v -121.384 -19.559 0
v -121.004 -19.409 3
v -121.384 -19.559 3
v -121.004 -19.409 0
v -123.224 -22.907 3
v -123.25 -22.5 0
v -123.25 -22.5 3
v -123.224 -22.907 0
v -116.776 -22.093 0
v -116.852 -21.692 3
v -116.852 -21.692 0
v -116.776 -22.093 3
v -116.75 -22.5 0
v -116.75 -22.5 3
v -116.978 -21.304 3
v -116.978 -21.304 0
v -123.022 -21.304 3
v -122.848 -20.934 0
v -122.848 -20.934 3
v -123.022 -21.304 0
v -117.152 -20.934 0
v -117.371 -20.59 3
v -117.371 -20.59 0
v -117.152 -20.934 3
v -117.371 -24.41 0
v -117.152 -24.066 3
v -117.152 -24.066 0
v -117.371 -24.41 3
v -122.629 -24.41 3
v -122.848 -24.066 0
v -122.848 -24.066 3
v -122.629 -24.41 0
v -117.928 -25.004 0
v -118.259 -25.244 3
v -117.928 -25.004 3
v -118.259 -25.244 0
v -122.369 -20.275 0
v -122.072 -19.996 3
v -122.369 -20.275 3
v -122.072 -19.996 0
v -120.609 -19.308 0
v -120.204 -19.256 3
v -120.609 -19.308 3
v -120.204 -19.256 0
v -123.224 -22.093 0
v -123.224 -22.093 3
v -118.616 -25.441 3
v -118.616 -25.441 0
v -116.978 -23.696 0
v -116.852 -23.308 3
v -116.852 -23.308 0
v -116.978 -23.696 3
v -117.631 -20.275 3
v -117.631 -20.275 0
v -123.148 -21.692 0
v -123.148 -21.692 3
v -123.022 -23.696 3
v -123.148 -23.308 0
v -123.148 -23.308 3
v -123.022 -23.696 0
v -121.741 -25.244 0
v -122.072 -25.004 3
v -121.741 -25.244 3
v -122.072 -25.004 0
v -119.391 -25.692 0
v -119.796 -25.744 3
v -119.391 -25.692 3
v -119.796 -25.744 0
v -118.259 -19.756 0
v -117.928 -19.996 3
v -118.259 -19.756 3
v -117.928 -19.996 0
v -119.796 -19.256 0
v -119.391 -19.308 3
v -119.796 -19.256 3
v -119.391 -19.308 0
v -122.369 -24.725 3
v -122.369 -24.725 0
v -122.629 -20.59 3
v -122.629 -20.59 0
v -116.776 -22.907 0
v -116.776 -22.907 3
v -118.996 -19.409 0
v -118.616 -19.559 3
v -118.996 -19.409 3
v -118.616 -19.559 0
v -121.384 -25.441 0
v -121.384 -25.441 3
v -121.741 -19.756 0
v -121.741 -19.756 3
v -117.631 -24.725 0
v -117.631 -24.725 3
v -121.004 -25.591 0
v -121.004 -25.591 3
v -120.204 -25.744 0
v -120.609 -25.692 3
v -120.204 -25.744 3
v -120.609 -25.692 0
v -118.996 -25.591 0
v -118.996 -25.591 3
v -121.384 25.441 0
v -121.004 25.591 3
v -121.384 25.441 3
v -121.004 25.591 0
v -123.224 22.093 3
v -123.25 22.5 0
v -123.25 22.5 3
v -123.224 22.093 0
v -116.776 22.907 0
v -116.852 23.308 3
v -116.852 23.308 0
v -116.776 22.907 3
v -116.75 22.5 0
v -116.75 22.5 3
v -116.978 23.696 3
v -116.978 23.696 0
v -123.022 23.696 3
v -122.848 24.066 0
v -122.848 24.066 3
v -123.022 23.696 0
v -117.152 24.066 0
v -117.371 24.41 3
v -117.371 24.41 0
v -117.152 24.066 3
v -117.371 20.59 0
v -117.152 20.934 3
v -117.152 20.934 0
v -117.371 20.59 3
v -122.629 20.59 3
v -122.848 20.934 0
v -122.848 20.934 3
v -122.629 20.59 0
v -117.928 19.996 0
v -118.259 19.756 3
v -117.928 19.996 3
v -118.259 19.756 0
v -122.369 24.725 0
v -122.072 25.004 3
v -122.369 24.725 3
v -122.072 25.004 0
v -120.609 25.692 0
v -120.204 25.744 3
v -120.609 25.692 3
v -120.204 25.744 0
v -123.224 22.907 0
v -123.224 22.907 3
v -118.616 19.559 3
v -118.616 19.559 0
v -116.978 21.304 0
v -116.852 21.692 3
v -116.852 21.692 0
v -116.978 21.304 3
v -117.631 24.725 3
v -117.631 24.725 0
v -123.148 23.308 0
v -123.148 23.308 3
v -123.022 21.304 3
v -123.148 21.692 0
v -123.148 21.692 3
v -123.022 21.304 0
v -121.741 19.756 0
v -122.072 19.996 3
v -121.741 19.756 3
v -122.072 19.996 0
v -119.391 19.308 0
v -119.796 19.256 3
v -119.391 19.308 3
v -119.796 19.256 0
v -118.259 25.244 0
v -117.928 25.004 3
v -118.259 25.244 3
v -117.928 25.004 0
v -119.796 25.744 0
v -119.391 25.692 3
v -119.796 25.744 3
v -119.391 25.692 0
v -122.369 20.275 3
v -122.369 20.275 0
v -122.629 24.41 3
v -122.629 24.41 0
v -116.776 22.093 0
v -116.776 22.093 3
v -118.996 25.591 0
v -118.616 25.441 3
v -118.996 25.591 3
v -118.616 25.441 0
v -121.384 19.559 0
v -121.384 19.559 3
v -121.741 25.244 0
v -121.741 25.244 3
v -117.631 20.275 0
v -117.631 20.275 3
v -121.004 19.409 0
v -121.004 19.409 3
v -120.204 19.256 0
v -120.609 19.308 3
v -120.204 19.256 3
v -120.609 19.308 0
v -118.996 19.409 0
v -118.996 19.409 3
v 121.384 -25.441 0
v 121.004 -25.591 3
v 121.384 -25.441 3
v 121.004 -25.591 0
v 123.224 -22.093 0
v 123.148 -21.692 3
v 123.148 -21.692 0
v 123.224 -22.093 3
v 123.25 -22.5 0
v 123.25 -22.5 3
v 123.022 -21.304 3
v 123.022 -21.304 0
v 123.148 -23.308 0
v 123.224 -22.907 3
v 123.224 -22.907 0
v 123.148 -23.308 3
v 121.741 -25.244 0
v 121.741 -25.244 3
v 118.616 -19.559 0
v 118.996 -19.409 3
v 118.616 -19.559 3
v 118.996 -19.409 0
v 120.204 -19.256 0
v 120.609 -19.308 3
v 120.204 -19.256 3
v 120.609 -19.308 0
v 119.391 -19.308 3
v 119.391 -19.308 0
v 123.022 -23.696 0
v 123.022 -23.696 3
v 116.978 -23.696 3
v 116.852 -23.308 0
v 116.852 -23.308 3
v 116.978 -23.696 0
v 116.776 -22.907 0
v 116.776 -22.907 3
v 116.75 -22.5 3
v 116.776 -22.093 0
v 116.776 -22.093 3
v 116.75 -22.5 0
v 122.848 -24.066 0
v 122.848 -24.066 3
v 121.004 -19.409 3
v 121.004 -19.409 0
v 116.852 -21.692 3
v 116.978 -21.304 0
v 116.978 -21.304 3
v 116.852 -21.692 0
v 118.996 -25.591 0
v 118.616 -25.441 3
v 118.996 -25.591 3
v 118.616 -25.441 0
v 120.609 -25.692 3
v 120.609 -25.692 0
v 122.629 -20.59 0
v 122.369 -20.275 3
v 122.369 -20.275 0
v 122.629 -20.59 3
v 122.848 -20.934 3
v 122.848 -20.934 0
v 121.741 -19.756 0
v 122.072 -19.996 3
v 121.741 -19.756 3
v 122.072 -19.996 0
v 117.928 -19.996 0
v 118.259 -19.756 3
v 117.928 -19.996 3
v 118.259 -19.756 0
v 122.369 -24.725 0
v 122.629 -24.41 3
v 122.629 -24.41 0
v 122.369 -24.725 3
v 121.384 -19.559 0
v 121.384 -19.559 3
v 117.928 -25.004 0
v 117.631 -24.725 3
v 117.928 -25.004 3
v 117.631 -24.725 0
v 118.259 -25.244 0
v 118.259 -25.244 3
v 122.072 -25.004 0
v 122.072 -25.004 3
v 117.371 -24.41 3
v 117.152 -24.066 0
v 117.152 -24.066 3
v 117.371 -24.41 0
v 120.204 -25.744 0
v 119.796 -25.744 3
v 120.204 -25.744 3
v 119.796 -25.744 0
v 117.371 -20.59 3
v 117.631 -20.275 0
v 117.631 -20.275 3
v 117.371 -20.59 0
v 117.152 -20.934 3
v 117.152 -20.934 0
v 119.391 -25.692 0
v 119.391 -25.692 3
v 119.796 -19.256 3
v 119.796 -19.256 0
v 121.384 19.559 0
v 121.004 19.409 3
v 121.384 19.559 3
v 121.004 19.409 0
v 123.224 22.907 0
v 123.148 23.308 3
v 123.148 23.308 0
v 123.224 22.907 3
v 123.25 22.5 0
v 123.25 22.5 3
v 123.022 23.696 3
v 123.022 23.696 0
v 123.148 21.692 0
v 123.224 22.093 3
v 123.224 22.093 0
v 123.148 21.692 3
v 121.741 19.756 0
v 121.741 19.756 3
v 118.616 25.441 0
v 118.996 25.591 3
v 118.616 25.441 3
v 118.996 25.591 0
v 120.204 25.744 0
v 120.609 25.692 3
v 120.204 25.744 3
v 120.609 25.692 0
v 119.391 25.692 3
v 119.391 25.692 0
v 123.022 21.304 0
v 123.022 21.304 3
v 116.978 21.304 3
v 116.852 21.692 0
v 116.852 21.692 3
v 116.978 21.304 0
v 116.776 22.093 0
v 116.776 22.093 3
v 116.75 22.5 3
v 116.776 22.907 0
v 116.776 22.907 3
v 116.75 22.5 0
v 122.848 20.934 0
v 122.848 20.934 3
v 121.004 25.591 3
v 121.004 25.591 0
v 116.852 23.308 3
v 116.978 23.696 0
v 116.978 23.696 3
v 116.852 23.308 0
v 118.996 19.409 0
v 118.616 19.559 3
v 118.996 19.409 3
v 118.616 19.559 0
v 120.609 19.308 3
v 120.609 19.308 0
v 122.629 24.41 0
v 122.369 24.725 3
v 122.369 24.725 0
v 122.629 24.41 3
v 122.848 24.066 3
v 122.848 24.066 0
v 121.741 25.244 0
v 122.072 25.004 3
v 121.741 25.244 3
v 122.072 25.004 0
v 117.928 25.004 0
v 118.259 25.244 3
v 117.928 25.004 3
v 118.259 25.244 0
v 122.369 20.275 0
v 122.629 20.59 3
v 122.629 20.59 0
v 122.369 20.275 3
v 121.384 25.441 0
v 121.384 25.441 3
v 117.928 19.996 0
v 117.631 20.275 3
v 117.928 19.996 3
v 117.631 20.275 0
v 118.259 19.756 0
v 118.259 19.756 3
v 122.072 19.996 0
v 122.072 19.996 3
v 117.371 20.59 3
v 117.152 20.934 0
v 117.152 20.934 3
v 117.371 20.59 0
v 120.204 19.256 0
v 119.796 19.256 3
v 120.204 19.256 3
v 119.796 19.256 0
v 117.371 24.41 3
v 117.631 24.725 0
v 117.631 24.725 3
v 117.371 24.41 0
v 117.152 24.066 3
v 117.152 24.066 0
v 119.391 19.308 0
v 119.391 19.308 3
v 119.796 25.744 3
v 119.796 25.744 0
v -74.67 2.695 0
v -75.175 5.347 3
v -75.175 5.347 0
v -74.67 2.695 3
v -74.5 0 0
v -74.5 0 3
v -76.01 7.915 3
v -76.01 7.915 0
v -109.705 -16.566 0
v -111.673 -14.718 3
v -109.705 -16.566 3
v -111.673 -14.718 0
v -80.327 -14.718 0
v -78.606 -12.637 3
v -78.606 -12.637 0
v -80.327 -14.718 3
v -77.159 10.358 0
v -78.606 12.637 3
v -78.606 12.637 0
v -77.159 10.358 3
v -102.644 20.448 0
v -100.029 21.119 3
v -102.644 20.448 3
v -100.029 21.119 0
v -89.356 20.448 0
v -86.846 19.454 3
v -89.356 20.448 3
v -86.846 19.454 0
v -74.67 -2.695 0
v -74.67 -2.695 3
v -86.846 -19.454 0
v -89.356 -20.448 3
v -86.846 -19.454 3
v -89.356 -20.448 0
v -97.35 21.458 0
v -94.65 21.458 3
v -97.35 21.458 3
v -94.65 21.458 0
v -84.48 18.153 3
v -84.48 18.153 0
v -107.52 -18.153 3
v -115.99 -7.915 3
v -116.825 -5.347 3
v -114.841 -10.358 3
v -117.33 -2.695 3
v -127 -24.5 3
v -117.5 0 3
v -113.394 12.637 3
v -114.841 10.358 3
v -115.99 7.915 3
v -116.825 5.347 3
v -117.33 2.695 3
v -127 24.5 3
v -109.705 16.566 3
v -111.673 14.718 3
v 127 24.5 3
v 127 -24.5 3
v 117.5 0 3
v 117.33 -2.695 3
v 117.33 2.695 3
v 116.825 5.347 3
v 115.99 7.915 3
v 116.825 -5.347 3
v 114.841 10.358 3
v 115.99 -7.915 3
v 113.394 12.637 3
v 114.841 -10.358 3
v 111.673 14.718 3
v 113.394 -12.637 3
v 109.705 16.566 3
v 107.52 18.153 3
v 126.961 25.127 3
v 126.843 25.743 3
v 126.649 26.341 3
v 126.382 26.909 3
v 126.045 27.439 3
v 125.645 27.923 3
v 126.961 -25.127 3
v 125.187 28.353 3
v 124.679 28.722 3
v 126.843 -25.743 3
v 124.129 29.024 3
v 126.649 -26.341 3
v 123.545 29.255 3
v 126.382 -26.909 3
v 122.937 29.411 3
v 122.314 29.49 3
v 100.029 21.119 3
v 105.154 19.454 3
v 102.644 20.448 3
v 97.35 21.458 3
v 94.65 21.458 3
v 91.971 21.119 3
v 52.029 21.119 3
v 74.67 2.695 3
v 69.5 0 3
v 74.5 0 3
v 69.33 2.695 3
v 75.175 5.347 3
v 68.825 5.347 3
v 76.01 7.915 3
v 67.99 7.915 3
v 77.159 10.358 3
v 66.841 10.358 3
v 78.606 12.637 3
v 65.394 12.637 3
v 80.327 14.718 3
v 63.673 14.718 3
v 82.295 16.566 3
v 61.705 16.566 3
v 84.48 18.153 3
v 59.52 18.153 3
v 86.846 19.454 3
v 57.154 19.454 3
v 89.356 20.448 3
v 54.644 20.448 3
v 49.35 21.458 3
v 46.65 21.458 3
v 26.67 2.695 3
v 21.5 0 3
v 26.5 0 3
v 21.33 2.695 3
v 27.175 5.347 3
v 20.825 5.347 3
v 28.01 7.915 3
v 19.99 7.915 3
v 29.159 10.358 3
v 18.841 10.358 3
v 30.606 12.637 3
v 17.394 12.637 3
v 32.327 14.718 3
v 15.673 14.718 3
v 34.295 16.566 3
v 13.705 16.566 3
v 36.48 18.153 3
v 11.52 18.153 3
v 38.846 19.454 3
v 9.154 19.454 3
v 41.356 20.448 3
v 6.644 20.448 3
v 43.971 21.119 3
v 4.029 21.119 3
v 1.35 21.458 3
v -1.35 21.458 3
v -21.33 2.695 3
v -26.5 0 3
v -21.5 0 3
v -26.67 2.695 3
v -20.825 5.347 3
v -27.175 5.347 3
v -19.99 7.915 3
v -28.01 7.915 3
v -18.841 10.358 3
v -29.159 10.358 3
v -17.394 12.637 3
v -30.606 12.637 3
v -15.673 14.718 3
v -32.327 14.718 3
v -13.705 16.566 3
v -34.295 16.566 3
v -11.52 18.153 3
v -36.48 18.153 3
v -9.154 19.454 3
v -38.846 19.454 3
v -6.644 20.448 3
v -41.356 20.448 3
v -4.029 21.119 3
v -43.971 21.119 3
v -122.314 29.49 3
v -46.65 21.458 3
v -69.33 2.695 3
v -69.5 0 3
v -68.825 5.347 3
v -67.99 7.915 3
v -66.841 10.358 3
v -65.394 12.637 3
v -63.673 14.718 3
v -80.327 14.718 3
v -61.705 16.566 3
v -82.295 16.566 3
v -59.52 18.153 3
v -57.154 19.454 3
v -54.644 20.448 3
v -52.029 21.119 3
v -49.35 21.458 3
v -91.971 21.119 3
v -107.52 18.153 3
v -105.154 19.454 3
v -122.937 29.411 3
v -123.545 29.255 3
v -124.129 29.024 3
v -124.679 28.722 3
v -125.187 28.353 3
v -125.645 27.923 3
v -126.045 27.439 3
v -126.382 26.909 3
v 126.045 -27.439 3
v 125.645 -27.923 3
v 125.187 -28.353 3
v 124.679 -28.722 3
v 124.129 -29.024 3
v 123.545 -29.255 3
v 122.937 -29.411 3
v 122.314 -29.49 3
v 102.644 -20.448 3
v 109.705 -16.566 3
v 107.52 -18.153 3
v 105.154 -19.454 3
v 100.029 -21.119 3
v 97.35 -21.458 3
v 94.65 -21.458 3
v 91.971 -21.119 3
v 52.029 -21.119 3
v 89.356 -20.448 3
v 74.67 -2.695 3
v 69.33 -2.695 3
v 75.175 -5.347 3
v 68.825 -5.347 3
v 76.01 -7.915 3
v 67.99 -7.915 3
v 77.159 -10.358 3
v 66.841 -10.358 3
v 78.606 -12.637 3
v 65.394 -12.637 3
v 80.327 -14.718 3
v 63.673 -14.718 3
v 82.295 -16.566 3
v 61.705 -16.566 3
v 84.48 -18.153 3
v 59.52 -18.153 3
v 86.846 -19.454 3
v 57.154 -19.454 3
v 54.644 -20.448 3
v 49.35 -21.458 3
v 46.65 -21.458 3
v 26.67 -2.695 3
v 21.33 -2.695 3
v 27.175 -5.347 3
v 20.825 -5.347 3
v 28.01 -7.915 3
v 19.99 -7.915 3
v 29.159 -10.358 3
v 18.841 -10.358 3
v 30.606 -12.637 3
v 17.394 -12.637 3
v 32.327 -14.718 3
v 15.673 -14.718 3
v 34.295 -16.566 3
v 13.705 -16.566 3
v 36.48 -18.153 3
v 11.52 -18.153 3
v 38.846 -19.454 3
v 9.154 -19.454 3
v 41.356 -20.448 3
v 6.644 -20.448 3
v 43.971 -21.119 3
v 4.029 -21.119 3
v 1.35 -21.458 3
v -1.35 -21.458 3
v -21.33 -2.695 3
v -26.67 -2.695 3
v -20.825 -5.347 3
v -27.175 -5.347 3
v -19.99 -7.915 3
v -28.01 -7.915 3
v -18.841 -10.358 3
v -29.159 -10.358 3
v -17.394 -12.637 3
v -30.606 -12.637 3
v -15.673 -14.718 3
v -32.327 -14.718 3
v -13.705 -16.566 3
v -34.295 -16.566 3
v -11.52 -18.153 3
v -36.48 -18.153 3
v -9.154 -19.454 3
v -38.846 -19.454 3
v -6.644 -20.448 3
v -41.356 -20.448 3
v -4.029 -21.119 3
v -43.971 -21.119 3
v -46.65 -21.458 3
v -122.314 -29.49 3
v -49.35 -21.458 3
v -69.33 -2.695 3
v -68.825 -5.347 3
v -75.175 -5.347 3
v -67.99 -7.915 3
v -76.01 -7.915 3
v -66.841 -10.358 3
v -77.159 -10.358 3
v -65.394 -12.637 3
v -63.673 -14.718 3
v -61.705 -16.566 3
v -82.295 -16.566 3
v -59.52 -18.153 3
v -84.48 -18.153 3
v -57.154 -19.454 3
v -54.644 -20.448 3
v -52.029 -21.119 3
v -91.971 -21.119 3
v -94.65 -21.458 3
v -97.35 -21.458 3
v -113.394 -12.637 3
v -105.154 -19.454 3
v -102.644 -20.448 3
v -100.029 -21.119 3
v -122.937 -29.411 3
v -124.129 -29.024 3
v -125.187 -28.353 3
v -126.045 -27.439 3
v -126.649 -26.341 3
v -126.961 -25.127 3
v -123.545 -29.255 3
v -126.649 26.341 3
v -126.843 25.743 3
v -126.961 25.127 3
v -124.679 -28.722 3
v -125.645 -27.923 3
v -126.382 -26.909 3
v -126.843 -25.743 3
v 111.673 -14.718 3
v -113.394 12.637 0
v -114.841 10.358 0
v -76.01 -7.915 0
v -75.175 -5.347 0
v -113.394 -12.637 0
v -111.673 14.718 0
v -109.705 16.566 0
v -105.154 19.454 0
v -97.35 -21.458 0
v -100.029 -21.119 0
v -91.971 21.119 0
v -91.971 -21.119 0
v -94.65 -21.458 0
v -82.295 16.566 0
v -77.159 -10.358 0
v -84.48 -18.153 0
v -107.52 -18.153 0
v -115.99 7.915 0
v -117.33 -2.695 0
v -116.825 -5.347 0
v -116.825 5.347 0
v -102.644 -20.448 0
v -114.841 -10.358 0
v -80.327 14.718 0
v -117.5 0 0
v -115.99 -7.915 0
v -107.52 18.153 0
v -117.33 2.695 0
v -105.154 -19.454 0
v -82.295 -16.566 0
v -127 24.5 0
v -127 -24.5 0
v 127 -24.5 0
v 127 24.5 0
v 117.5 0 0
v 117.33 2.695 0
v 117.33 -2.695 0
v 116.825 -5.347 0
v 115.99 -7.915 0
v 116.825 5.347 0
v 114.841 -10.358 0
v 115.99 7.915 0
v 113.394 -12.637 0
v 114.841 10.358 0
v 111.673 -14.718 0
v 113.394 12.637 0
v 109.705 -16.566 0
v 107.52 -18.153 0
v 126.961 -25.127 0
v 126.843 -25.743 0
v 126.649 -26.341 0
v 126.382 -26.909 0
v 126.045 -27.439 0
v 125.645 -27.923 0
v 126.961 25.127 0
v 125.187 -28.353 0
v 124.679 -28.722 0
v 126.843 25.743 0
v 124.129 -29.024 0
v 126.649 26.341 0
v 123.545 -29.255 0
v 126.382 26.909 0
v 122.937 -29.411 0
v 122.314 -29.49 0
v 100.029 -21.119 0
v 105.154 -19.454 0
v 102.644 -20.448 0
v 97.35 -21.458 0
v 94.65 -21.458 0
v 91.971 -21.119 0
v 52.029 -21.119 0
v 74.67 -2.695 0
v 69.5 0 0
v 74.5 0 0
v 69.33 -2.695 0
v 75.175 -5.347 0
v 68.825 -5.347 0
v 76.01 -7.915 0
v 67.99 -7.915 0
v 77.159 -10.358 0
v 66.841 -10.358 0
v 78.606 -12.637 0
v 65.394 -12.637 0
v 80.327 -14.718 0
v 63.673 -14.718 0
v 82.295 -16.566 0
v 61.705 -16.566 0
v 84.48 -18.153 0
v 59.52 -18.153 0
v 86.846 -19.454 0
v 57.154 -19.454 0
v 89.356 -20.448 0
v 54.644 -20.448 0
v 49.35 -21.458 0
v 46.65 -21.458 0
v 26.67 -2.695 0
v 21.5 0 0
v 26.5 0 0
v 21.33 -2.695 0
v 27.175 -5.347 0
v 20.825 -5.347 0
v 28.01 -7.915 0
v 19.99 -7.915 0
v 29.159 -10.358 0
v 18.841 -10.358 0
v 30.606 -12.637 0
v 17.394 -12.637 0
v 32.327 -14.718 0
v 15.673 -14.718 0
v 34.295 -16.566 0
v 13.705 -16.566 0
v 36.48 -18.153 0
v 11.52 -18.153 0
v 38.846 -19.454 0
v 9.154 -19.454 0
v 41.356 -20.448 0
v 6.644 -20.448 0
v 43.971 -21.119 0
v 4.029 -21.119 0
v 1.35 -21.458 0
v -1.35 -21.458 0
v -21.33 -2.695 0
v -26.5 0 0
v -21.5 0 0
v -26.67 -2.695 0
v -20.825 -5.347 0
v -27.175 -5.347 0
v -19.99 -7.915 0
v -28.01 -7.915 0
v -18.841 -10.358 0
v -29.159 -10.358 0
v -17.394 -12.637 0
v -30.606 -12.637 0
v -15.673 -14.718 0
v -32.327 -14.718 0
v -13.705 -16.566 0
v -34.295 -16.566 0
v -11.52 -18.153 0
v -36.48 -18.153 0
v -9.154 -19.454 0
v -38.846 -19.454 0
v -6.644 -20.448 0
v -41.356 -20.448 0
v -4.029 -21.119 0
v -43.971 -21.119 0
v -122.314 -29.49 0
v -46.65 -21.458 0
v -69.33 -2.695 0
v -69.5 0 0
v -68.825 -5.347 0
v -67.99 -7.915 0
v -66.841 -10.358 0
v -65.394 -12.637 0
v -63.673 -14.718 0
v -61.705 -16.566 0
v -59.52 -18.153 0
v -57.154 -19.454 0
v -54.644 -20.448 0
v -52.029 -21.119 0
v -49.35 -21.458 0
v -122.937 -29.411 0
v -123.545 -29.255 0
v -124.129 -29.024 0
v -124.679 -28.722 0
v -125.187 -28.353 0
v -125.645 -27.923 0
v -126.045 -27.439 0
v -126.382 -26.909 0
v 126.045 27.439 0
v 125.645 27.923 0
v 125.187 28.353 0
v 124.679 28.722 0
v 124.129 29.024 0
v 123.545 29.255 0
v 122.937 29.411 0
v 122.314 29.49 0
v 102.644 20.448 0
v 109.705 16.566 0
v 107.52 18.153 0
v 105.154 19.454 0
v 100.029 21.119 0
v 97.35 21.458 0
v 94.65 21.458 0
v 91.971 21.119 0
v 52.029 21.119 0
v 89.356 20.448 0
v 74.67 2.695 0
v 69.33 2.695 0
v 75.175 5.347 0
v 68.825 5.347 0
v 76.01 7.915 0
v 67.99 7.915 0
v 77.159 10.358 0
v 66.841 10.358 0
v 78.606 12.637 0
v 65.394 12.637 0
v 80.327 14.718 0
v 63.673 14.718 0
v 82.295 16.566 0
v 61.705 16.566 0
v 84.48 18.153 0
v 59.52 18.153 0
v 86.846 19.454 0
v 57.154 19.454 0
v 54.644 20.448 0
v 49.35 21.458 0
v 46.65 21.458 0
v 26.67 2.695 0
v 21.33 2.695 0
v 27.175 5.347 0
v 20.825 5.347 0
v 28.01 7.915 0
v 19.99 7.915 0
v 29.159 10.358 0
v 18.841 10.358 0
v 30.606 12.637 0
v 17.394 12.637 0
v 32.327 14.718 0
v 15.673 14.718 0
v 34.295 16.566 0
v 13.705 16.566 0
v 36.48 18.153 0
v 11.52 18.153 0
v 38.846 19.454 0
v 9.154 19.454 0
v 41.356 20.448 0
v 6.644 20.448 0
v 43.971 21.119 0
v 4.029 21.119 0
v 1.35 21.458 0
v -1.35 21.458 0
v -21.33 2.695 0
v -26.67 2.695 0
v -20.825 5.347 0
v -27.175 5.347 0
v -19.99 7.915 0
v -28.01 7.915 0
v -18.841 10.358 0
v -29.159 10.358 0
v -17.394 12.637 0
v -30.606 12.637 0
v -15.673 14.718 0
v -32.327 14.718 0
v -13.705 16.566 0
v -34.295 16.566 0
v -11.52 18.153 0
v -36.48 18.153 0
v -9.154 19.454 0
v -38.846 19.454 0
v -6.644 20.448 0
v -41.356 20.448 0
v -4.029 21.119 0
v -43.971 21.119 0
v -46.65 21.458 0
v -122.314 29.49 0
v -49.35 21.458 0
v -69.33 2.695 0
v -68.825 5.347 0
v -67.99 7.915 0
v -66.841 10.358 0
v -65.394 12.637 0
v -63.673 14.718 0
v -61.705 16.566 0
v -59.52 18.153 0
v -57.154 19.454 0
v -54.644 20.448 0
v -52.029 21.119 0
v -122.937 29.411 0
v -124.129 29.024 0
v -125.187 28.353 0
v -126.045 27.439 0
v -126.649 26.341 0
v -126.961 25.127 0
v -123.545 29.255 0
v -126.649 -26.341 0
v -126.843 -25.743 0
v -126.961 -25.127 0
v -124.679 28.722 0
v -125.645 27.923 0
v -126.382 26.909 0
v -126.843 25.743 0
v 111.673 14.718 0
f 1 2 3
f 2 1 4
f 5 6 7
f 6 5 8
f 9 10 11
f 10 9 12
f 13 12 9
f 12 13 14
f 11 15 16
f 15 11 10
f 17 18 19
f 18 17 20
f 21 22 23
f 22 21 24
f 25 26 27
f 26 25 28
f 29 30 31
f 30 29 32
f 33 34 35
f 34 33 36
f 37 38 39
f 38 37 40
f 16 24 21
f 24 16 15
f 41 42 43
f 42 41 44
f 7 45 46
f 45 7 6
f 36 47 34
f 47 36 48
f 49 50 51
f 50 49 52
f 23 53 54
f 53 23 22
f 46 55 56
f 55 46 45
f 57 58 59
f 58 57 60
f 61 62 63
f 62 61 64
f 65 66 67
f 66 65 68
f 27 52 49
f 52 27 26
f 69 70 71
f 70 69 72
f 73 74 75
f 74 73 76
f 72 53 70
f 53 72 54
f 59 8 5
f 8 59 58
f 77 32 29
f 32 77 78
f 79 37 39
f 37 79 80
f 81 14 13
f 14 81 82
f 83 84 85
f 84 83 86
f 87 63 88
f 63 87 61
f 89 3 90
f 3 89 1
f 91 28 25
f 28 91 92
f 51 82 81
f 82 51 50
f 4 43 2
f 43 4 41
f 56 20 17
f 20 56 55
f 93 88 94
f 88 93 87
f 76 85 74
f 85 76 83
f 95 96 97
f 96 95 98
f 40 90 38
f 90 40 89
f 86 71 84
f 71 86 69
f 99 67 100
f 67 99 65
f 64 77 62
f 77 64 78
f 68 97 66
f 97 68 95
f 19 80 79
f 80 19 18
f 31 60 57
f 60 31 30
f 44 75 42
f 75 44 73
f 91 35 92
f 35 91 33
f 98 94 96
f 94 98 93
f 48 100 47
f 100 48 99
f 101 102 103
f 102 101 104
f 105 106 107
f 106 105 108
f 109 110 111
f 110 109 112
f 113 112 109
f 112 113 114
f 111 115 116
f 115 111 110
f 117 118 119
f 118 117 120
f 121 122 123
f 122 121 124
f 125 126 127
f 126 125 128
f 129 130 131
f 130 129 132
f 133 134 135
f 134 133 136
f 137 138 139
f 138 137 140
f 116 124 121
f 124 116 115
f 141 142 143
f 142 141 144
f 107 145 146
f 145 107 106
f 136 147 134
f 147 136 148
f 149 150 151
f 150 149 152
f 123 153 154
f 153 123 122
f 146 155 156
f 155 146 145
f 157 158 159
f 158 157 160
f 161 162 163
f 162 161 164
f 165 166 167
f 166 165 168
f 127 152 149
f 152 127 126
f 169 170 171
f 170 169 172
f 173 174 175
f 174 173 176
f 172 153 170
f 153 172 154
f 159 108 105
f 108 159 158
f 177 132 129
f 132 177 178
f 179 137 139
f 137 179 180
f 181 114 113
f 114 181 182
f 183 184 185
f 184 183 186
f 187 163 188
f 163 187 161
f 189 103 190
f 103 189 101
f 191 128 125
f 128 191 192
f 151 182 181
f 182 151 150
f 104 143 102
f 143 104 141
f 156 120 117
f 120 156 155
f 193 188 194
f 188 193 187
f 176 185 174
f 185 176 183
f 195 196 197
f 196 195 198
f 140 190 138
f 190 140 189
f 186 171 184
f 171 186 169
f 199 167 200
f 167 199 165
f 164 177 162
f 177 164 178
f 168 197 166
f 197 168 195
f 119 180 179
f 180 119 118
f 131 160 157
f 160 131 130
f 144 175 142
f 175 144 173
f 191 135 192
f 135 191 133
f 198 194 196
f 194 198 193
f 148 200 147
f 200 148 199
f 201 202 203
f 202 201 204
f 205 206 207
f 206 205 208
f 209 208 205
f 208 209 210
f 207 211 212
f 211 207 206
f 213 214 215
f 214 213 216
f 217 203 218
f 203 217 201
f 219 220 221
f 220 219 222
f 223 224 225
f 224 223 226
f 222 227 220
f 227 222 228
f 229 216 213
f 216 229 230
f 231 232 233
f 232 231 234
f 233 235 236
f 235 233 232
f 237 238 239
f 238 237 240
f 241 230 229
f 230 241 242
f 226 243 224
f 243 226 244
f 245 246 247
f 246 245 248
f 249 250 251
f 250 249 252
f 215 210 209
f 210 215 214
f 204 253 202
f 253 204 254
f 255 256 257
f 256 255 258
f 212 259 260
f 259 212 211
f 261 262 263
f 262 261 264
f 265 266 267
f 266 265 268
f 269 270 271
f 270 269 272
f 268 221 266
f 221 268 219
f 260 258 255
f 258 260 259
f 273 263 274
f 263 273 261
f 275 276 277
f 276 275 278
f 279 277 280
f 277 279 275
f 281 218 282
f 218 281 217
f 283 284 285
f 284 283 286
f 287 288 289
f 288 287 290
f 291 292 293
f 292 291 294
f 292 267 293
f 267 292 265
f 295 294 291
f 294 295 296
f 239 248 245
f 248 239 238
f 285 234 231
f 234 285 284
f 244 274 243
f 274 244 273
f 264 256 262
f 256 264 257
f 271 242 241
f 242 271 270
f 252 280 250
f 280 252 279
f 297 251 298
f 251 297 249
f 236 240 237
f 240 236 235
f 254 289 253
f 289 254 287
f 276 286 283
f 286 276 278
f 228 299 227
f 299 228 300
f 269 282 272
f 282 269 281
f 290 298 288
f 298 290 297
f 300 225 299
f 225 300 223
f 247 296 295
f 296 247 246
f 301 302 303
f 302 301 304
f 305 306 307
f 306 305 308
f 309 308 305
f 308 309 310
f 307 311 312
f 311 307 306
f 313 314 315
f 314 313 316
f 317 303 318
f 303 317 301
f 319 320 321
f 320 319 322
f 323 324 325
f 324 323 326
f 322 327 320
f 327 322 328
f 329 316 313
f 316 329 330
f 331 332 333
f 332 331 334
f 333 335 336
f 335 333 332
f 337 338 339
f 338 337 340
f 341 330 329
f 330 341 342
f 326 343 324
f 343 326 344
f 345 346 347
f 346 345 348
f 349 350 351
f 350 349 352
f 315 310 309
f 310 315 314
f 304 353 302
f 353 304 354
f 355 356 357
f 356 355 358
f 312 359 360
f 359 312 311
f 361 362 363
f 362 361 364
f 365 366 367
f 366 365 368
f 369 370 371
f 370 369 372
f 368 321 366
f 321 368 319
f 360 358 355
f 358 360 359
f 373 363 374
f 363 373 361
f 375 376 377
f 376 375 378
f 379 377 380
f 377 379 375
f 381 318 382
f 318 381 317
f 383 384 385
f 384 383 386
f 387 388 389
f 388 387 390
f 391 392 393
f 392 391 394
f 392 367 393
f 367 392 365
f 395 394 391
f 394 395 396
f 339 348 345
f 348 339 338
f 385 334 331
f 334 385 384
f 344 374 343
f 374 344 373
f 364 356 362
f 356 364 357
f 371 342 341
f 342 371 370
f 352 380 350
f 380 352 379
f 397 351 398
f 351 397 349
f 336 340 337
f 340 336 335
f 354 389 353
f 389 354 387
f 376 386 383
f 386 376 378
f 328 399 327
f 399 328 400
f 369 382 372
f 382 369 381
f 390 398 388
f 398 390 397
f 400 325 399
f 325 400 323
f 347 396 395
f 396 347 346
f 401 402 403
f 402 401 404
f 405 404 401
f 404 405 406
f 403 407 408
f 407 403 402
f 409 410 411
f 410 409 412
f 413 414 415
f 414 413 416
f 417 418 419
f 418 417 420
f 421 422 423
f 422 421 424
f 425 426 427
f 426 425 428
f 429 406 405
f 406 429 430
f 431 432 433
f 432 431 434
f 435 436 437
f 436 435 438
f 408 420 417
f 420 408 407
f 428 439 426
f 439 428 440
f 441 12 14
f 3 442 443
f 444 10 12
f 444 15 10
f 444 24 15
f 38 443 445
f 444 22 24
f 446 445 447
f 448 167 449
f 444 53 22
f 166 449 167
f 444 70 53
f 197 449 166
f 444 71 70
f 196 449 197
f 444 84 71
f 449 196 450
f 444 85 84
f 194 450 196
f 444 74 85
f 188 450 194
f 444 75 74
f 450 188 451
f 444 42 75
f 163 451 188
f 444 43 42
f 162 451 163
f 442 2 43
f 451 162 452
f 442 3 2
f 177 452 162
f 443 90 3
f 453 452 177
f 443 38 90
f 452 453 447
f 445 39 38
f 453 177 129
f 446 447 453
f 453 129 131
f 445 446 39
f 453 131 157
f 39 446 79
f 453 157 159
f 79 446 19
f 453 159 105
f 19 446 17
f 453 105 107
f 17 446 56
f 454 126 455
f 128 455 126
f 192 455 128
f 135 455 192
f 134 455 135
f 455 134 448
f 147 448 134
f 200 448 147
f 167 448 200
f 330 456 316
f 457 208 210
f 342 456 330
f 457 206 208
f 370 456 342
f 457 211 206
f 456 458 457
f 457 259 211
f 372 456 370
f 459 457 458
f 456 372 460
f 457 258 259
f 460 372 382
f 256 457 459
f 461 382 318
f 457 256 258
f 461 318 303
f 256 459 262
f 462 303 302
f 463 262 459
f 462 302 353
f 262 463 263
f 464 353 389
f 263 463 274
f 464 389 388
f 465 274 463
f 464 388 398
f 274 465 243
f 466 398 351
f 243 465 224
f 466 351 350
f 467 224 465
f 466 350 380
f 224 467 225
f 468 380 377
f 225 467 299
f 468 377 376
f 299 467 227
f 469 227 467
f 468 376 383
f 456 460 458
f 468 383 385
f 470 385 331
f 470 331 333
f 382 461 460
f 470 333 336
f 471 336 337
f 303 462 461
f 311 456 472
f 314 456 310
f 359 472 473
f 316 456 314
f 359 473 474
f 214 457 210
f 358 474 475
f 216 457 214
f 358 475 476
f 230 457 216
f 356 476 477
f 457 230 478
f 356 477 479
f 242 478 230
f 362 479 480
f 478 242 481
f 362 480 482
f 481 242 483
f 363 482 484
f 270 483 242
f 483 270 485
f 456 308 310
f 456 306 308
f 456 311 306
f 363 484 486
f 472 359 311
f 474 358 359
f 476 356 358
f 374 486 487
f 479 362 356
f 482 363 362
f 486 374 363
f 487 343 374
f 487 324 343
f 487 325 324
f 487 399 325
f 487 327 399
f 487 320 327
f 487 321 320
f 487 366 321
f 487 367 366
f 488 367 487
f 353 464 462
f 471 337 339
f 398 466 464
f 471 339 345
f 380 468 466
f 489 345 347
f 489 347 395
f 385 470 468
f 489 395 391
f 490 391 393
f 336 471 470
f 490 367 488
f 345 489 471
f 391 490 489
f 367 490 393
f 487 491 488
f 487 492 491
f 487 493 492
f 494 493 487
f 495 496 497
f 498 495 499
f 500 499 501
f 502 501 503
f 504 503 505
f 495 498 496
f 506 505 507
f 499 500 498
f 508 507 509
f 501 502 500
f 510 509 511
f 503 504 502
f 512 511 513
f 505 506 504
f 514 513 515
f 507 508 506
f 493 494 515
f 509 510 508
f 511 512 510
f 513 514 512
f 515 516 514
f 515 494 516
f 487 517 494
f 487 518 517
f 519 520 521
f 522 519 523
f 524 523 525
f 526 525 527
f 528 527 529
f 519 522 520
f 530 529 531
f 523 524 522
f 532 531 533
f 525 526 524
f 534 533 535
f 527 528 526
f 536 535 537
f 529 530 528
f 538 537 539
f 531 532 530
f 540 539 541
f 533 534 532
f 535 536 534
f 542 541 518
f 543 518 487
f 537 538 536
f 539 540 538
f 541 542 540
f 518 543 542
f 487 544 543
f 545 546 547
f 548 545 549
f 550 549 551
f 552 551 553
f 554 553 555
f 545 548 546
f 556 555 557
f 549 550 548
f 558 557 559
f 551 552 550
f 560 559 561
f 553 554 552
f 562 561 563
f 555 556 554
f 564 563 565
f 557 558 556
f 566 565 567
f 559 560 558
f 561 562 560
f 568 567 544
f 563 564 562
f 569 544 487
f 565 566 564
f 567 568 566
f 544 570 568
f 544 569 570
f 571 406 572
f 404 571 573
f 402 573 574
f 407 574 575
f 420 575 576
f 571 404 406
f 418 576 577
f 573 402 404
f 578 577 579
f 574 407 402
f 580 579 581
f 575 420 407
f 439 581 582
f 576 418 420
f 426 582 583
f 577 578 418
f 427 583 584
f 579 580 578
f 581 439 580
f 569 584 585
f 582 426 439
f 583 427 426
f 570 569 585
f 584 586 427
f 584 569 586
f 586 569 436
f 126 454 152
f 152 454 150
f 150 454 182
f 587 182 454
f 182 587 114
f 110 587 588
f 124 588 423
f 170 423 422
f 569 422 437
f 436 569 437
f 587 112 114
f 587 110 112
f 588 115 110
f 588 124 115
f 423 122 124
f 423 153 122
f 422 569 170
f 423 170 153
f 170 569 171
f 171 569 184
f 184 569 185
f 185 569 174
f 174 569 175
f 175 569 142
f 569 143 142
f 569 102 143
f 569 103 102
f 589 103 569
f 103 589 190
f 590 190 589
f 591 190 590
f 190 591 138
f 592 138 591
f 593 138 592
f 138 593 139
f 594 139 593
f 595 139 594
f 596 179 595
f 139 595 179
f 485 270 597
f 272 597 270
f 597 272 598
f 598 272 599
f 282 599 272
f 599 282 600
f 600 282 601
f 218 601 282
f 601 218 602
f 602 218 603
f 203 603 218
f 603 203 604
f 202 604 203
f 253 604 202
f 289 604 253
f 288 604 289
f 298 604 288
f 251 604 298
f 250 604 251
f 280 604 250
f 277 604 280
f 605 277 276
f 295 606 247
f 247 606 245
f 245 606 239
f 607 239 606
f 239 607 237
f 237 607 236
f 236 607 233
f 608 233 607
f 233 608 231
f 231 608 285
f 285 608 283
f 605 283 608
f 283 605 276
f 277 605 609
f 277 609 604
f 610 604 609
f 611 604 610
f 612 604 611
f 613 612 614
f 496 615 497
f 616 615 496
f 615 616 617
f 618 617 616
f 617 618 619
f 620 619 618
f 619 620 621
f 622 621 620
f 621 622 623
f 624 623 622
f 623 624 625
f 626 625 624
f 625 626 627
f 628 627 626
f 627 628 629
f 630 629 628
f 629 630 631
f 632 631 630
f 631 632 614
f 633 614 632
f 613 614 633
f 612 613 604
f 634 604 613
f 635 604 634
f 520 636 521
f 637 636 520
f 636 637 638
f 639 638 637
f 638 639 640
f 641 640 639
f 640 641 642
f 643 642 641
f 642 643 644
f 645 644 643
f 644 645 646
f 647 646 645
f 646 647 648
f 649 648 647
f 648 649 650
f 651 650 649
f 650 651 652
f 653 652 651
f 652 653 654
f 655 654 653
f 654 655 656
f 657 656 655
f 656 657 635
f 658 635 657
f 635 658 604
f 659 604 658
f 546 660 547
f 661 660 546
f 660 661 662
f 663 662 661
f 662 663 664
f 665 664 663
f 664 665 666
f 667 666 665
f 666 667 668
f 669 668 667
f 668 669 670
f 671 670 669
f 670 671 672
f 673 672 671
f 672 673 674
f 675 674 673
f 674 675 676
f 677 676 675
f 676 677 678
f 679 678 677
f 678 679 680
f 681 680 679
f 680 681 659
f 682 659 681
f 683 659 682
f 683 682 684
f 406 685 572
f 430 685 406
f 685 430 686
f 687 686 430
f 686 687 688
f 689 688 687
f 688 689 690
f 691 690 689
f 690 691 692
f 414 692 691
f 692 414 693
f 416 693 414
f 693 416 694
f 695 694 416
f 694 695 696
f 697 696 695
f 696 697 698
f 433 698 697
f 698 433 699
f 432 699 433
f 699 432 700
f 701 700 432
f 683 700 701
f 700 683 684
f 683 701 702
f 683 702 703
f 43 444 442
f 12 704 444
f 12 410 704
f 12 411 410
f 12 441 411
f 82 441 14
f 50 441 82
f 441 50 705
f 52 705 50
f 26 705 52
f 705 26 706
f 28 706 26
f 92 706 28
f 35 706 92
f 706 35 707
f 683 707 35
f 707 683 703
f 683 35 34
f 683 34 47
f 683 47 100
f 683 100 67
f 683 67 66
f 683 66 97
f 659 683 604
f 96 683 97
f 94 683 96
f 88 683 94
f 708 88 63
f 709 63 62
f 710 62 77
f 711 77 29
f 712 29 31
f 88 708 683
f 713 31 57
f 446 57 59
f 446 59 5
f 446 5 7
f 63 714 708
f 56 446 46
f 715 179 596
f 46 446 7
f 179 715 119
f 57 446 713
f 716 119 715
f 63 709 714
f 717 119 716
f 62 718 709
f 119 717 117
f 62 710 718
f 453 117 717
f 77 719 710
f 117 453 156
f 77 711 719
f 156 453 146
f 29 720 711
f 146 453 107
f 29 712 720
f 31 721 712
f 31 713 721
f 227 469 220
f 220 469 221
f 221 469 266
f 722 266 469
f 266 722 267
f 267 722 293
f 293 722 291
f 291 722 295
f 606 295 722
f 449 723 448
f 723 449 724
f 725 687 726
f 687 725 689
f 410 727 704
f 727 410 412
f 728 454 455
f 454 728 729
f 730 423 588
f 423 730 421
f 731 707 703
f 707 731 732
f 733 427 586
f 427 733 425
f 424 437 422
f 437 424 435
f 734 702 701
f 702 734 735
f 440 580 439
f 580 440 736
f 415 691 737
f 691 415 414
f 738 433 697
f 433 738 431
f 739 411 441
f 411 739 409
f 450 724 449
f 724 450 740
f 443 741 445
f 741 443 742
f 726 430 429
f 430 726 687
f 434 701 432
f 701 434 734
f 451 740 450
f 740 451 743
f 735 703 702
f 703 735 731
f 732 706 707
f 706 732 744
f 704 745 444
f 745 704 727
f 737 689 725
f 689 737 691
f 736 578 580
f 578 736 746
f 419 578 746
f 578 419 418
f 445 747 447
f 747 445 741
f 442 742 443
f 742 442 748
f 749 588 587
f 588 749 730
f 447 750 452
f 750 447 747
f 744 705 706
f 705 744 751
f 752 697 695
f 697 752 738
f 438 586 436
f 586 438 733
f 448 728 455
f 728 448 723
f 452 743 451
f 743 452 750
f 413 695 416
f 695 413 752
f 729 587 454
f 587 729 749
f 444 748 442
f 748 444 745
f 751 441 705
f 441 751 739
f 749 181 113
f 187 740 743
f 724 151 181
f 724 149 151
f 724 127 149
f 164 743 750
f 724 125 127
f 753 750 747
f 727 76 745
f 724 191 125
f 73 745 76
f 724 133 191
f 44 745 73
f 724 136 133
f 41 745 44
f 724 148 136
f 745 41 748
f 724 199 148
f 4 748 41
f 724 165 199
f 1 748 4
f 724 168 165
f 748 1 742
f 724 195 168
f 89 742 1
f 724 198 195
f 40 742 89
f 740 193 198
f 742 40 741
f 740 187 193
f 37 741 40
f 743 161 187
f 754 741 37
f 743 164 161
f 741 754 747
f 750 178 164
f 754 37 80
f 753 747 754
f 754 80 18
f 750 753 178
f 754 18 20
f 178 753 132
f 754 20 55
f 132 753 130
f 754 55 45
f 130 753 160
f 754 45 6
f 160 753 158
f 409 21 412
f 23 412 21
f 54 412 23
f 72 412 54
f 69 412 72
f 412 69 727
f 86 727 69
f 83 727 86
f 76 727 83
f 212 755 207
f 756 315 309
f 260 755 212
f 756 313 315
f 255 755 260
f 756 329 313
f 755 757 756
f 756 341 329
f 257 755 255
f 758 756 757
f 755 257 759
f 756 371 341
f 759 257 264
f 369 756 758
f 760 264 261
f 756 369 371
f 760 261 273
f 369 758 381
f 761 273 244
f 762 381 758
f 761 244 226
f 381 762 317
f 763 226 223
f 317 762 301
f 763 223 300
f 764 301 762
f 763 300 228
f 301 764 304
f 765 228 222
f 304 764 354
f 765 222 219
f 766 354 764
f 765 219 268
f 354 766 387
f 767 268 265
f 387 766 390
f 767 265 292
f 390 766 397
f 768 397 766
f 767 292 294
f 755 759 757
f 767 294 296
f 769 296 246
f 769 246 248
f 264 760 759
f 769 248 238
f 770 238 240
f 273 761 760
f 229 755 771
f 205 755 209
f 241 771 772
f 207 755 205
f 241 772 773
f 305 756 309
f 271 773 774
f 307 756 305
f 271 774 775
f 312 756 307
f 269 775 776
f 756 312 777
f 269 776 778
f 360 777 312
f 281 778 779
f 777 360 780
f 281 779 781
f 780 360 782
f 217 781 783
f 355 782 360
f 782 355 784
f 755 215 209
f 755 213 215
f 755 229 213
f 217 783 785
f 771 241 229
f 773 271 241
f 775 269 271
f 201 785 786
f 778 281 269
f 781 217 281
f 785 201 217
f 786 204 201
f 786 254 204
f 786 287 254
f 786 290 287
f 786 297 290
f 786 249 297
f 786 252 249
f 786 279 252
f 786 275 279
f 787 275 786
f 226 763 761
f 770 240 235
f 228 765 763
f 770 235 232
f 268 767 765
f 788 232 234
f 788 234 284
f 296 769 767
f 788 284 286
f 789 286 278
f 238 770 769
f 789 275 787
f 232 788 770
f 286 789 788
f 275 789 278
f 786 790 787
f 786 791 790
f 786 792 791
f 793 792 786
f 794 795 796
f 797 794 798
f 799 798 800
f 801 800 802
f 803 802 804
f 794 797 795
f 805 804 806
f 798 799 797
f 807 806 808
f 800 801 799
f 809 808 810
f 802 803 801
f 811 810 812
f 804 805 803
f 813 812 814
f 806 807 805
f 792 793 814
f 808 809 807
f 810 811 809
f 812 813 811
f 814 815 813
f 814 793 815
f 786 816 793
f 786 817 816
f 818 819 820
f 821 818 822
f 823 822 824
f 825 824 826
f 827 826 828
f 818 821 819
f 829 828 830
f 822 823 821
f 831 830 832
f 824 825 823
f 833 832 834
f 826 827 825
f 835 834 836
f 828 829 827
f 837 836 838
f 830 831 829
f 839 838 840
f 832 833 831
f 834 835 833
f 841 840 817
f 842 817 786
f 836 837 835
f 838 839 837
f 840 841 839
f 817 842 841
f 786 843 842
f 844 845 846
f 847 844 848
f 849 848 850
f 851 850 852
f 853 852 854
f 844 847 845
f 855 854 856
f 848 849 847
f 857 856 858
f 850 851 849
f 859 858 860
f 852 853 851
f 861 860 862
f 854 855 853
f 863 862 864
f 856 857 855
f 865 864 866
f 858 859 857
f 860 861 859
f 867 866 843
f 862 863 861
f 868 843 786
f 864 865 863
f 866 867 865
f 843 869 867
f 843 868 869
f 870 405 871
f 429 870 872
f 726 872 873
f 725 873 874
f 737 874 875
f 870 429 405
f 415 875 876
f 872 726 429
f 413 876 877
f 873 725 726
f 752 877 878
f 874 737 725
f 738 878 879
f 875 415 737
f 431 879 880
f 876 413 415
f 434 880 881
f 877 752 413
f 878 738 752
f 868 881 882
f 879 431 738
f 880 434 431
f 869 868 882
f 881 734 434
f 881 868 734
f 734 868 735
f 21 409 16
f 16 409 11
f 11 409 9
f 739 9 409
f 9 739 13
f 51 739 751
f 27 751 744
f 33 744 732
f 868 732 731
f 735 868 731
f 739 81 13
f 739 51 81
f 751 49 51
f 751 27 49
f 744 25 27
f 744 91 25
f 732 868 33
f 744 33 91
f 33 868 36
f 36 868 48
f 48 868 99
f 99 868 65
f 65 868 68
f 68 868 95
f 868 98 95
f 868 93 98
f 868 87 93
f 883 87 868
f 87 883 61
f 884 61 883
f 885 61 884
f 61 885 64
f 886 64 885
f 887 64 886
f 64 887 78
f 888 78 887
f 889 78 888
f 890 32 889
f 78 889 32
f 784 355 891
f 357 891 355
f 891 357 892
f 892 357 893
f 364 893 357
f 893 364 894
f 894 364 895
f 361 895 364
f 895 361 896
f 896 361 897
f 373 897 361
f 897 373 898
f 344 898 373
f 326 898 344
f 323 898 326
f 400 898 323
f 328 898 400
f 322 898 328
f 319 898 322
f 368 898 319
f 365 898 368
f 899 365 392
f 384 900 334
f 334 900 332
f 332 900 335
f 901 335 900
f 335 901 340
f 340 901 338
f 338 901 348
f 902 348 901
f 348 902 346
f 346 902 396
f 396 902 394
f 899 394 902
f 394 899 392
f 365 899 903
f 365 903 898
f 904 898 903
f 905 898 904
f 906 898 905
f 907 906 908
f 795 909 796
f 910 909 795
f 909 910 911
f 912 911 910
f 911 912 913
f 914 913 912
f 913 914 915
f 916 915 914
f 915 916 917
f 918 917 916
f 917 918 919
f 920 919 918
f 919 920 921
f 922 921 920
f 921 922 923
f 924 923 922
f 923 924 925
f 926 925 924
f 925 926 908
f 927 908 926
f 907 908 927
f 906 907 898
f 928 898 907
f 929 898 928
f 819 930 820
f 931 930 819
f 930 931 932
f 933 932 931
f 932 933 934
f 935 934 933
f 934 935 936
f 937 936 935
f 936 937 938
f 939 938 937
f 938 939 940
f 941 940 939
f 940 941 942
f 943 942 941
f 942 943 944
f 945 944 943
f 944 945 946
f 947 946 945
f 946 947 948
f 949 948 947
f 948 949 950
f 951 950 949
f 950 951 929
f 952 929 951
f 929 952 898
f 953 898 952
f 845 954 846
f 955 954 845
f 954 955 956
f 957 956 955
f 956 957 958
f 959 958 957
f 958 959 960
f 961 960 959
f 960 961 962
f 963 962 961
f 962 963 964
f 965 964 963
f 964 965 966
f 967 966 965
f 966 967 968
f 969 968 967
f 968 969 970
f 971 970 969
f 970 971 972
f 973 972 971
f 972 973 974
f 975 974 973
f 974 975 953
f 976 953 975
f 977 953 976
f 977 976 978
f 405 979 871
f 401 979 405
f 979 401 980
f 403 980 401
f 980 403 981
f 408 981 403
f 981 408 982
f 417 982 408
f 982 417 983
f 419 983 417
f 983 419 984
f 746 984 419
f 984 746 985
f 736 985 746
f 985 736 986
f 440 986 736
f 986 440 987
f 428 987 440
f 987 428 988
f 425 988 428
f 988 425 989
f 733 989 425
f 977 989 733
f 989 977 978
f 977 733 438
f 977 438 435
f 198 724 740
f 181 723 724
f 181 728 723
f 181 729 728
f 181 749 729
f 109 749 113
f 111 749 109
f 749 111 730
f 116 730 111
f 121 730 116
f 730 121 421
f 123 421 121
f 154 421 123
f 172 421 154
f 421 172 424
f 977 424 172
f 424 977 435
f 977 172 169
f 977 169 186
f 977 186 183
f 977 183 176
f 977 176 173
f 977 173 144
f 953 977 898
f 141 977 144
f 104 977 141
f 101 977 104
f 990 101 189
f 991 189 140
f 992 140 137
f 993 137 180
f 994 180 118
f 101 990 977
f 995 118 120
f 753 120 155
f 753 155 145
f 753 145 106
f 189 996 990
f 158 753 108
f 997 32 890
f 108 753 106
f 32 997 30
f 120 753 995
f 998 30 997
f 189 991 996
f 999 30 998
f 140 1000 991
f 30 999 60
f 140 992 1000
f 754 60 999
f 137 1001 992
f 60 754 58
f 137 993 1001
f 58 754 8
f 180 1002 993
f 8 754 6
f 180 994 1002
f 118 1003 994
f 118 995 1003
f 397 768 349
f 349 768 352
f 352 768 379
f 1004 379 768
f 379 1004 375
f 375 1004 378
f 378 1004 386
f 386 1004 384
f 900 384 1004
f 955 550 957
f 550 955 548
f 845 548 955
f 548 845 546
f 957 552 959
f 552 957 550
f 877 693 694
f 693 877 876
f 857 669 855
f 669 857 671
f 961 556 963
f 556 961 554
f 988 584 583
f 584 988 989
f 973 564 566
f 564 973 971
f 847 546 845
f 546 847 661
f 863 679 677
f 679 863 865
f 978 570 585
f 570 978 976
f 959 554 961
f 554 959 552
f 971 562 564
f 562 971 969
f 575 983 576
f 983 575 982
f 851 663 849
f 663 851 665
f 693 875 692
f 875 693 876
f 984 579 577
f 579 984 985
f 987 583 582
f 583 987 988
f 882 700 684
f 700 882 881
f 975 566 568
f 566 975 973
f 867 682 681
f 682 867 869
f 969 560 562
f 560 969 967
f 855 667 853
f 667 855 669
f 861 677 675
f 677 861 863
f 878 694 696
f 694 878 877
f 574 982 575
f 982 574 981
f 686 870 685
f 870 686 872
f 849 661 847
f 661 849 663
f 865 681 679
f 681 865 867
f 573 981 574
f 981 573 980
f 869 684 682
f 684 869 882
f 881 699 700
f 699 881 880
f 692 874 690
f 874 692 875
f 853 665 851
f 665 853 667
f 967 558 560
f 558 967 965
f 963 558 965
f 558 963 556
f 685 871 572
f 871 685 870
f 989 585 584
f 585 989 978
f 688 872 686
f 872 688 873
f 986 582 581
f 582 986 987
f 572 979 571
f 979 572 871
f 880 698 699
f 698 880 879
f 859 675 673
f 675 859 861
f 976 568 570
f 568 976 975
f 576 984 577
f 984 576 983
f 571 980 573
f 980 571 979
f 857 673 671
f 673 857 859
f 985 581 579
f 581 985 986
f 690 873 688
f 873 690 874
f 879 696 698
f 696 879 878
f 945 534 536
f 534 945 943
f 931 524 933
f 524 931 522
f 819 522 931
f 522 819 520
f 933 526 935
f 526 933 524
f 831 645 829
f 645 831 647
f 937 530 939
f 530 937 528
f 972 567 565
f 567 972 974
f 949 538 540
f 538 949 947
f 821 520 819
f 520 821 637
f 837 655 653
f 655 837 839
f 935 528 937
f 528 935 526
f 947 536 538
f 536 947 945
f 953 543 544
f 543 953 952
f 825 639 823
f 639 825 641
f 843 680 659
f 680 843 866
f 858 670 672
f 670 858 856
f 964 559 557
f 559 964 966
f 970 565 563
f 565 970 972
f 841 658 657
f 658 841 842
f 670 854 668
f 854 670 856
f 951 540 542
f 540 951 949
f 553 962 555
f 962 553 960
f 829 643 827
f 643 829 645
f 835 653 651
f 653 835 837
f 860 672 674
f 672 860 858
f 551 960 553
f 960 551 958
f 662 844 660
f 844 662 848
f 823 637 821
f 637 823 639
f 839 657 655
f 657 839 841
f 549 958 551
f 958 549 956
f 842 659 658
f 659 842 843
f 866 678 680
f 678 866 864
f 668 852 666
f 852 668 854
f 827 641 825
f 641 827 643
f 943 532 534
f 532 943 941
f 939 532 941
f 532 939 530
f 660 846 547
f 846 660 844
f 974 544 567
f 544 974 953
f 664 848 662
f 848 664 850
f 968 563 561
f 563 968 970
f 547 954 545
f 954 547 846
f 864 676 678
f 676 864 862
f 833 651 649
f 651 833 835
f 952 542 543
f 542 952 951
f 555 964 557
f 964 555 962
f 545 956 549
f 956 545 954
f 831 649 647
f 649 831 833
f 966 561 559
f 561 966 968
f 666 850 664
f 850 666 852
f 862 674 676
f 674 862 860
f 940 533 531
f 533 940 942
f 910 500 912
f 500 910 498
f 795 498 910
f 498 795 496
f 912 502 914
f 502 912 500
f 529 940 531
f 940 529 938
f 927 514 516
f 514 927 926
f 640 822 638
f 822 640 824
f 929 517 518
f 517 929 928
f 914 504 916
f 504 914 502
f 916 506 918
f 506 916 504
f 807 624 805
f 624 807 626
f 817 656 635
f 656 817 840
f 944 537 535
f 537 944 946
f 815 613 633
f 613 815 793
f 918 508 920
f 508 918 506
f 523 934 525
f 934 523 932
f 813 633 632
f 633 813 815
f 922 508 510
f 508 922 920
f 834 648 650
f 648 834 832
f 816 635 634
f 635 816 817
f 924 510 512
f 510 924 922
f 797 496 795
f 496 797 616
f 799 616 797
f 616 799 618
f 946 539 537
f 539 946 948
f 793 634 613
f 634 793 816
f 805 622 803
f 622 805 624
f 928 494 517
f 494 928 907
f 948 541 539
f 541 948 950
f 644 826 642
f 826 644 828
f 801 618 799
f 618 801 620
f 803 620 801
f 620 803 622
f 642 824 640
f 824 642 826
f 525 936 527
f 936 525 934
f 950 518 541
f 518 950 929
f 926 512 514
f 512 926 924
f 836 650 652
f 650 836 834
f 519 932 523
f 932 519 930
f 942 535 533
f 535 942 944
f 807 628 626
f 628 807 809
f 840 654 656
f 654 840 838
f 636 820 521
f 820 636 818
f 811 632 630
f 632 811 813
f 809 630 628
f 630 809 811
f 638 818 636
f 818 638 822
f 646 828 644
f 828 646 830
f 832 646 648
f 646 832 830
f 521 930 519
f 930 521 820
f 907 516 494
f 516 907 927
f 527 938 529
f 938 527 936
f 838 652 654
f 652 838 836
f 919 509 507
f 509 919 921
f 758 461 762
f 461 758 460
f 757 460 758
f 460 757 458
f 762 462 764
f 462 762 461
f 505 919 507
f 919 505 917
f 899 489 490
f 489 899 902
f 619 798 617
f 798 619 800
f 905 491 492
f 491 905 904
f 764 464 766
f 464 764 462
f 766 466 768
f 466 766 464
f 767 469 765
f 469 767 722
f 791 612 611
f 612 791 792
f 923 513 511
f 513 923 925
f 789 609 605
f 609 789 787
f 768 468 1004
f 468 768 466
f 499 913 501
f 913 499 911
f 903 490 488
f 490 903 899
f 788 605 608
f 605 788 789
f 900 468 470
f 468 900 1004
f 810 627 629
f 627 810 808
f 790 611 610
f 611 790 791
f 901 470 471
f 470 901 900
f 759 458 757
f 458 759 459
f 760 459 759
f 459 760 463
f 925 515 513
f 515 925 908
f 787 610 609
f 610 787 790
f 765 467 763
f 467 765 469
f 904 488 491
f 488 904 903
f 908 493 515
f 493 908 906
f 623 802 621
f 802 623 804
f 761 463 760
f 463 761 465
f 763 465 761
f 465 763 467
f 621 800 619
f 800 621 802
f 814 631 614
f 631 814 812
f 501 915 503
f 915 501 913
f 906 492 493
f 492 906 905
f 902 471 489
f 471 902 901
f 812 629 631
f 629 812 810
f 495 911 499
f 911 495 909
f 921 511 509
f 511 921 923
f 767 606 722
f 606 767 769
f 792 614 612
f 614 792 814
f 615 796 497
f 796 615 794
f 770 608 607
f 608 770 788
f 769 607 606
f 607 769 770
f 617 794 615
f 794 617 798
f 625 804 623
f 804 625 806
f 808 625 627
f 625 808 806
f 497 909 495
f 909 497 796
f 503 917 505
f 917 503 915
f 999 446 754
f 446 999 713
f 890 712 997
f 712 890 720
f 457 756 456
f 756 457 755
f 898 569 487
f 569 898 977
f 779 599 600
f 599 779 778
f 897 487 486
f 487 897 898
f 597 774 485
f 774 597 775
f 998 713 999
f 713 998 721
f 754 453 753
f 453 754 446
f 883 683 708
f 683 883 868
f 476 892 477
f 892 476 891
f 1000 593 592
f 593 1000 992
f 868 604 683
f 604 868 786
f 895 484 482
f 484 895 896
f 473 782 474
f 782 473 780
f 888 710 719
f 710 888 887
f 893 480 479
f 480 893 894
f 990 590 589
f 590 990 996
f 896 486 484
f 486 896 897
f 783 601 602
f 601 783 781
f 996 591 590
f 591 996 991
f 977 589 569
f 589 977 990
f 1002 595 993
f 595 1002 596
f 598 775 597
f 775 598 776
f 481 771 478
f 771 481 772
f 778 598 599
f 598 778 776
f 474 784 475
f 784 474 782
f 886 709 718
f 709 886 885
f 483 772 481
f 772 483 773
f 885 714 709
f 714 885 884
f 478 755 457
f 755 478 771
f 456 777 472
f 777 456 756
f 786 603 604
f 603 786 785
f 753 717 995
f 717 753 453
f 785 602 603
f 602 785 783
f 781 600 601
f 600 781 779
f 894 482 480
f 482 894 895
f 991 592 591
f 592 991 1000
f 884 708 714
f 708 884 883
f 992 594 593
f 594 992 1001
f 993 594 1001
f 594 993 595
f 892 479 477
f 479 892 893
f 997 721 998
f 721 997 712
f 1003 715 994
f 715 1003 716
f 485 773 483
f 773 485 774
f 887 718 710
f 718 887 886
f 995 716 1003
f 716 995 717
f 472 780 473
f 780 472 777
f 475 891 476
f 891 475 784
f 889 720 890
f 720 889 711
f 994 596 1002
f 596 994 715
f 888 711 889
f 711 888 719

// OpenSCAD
$fn = 50;

difference() {
	union() {
		hull() {
			translate(v = [-122.0, 24.5, 0]) {
				cylinder(h = 3, r = 5);
			}
			translate(v = [122.0, 24.5, 0]) {
				cylinder(h = 3, r = 5);
			}
			translate(v = [-122.0, -24.5, 0]) {
				cylinder(h = 3, r = 5);
			}
			translate(v = [122.0, -24.5, 0]) {
				cylinder(h = 3, r = 5);
			}
		}
	}
	union() {
		translate(v = [-120.0, -22.5, -100.0]) {
			cylinder(h = 200, r = 3.25);
		}
		translate(v = [-120.0, 22.5, -100.0]) {
			cylinder(h = 200, r = 3.25);
		}
		translate(v = [120.0, -22.5, -100.0]) {
			cylinder(h = 200, r = 3.25);
		}
		translate(v = [120.0, 22.5, -100.0]) {
			cylinder(h = 200, r = 3.25);
		}
		translate(v = [-120.0, -22.5, -100.0]) {
			cylinder(h = 200, r = 1.8);
		}
		translate(v = [-120.0, 22.5, -100.0]) {
			cylinder(h = 200, r = 1.8);
		}
		translate(v = [120.0, -22.5, -100.0]) {
			cylinder(h = 200, r = 1.8);
		}
		translate(v = [120.0, 22.5, -100.0]) {
			cylinder(h = 200, r = 1.8);
		}
		translate(v = [-96.0, 0, 0.0]) {
			cylinder(h = 3, r = 21.5);
		}
		translate(v = [-48.0, 0, 0.0]) {
			cylinder(h = 3, r = 21.5);
		}
		cylinder(h = 3, r = 21.5);
		translate(v = [48.0, 0, 0.0]) {
			cylinder(h = 3, r = 21.5);
		}
		translate(v = [96.0, 0, 0.0]) {
			cylinder(h = 3, r = 21.5);
		}
	}
}
